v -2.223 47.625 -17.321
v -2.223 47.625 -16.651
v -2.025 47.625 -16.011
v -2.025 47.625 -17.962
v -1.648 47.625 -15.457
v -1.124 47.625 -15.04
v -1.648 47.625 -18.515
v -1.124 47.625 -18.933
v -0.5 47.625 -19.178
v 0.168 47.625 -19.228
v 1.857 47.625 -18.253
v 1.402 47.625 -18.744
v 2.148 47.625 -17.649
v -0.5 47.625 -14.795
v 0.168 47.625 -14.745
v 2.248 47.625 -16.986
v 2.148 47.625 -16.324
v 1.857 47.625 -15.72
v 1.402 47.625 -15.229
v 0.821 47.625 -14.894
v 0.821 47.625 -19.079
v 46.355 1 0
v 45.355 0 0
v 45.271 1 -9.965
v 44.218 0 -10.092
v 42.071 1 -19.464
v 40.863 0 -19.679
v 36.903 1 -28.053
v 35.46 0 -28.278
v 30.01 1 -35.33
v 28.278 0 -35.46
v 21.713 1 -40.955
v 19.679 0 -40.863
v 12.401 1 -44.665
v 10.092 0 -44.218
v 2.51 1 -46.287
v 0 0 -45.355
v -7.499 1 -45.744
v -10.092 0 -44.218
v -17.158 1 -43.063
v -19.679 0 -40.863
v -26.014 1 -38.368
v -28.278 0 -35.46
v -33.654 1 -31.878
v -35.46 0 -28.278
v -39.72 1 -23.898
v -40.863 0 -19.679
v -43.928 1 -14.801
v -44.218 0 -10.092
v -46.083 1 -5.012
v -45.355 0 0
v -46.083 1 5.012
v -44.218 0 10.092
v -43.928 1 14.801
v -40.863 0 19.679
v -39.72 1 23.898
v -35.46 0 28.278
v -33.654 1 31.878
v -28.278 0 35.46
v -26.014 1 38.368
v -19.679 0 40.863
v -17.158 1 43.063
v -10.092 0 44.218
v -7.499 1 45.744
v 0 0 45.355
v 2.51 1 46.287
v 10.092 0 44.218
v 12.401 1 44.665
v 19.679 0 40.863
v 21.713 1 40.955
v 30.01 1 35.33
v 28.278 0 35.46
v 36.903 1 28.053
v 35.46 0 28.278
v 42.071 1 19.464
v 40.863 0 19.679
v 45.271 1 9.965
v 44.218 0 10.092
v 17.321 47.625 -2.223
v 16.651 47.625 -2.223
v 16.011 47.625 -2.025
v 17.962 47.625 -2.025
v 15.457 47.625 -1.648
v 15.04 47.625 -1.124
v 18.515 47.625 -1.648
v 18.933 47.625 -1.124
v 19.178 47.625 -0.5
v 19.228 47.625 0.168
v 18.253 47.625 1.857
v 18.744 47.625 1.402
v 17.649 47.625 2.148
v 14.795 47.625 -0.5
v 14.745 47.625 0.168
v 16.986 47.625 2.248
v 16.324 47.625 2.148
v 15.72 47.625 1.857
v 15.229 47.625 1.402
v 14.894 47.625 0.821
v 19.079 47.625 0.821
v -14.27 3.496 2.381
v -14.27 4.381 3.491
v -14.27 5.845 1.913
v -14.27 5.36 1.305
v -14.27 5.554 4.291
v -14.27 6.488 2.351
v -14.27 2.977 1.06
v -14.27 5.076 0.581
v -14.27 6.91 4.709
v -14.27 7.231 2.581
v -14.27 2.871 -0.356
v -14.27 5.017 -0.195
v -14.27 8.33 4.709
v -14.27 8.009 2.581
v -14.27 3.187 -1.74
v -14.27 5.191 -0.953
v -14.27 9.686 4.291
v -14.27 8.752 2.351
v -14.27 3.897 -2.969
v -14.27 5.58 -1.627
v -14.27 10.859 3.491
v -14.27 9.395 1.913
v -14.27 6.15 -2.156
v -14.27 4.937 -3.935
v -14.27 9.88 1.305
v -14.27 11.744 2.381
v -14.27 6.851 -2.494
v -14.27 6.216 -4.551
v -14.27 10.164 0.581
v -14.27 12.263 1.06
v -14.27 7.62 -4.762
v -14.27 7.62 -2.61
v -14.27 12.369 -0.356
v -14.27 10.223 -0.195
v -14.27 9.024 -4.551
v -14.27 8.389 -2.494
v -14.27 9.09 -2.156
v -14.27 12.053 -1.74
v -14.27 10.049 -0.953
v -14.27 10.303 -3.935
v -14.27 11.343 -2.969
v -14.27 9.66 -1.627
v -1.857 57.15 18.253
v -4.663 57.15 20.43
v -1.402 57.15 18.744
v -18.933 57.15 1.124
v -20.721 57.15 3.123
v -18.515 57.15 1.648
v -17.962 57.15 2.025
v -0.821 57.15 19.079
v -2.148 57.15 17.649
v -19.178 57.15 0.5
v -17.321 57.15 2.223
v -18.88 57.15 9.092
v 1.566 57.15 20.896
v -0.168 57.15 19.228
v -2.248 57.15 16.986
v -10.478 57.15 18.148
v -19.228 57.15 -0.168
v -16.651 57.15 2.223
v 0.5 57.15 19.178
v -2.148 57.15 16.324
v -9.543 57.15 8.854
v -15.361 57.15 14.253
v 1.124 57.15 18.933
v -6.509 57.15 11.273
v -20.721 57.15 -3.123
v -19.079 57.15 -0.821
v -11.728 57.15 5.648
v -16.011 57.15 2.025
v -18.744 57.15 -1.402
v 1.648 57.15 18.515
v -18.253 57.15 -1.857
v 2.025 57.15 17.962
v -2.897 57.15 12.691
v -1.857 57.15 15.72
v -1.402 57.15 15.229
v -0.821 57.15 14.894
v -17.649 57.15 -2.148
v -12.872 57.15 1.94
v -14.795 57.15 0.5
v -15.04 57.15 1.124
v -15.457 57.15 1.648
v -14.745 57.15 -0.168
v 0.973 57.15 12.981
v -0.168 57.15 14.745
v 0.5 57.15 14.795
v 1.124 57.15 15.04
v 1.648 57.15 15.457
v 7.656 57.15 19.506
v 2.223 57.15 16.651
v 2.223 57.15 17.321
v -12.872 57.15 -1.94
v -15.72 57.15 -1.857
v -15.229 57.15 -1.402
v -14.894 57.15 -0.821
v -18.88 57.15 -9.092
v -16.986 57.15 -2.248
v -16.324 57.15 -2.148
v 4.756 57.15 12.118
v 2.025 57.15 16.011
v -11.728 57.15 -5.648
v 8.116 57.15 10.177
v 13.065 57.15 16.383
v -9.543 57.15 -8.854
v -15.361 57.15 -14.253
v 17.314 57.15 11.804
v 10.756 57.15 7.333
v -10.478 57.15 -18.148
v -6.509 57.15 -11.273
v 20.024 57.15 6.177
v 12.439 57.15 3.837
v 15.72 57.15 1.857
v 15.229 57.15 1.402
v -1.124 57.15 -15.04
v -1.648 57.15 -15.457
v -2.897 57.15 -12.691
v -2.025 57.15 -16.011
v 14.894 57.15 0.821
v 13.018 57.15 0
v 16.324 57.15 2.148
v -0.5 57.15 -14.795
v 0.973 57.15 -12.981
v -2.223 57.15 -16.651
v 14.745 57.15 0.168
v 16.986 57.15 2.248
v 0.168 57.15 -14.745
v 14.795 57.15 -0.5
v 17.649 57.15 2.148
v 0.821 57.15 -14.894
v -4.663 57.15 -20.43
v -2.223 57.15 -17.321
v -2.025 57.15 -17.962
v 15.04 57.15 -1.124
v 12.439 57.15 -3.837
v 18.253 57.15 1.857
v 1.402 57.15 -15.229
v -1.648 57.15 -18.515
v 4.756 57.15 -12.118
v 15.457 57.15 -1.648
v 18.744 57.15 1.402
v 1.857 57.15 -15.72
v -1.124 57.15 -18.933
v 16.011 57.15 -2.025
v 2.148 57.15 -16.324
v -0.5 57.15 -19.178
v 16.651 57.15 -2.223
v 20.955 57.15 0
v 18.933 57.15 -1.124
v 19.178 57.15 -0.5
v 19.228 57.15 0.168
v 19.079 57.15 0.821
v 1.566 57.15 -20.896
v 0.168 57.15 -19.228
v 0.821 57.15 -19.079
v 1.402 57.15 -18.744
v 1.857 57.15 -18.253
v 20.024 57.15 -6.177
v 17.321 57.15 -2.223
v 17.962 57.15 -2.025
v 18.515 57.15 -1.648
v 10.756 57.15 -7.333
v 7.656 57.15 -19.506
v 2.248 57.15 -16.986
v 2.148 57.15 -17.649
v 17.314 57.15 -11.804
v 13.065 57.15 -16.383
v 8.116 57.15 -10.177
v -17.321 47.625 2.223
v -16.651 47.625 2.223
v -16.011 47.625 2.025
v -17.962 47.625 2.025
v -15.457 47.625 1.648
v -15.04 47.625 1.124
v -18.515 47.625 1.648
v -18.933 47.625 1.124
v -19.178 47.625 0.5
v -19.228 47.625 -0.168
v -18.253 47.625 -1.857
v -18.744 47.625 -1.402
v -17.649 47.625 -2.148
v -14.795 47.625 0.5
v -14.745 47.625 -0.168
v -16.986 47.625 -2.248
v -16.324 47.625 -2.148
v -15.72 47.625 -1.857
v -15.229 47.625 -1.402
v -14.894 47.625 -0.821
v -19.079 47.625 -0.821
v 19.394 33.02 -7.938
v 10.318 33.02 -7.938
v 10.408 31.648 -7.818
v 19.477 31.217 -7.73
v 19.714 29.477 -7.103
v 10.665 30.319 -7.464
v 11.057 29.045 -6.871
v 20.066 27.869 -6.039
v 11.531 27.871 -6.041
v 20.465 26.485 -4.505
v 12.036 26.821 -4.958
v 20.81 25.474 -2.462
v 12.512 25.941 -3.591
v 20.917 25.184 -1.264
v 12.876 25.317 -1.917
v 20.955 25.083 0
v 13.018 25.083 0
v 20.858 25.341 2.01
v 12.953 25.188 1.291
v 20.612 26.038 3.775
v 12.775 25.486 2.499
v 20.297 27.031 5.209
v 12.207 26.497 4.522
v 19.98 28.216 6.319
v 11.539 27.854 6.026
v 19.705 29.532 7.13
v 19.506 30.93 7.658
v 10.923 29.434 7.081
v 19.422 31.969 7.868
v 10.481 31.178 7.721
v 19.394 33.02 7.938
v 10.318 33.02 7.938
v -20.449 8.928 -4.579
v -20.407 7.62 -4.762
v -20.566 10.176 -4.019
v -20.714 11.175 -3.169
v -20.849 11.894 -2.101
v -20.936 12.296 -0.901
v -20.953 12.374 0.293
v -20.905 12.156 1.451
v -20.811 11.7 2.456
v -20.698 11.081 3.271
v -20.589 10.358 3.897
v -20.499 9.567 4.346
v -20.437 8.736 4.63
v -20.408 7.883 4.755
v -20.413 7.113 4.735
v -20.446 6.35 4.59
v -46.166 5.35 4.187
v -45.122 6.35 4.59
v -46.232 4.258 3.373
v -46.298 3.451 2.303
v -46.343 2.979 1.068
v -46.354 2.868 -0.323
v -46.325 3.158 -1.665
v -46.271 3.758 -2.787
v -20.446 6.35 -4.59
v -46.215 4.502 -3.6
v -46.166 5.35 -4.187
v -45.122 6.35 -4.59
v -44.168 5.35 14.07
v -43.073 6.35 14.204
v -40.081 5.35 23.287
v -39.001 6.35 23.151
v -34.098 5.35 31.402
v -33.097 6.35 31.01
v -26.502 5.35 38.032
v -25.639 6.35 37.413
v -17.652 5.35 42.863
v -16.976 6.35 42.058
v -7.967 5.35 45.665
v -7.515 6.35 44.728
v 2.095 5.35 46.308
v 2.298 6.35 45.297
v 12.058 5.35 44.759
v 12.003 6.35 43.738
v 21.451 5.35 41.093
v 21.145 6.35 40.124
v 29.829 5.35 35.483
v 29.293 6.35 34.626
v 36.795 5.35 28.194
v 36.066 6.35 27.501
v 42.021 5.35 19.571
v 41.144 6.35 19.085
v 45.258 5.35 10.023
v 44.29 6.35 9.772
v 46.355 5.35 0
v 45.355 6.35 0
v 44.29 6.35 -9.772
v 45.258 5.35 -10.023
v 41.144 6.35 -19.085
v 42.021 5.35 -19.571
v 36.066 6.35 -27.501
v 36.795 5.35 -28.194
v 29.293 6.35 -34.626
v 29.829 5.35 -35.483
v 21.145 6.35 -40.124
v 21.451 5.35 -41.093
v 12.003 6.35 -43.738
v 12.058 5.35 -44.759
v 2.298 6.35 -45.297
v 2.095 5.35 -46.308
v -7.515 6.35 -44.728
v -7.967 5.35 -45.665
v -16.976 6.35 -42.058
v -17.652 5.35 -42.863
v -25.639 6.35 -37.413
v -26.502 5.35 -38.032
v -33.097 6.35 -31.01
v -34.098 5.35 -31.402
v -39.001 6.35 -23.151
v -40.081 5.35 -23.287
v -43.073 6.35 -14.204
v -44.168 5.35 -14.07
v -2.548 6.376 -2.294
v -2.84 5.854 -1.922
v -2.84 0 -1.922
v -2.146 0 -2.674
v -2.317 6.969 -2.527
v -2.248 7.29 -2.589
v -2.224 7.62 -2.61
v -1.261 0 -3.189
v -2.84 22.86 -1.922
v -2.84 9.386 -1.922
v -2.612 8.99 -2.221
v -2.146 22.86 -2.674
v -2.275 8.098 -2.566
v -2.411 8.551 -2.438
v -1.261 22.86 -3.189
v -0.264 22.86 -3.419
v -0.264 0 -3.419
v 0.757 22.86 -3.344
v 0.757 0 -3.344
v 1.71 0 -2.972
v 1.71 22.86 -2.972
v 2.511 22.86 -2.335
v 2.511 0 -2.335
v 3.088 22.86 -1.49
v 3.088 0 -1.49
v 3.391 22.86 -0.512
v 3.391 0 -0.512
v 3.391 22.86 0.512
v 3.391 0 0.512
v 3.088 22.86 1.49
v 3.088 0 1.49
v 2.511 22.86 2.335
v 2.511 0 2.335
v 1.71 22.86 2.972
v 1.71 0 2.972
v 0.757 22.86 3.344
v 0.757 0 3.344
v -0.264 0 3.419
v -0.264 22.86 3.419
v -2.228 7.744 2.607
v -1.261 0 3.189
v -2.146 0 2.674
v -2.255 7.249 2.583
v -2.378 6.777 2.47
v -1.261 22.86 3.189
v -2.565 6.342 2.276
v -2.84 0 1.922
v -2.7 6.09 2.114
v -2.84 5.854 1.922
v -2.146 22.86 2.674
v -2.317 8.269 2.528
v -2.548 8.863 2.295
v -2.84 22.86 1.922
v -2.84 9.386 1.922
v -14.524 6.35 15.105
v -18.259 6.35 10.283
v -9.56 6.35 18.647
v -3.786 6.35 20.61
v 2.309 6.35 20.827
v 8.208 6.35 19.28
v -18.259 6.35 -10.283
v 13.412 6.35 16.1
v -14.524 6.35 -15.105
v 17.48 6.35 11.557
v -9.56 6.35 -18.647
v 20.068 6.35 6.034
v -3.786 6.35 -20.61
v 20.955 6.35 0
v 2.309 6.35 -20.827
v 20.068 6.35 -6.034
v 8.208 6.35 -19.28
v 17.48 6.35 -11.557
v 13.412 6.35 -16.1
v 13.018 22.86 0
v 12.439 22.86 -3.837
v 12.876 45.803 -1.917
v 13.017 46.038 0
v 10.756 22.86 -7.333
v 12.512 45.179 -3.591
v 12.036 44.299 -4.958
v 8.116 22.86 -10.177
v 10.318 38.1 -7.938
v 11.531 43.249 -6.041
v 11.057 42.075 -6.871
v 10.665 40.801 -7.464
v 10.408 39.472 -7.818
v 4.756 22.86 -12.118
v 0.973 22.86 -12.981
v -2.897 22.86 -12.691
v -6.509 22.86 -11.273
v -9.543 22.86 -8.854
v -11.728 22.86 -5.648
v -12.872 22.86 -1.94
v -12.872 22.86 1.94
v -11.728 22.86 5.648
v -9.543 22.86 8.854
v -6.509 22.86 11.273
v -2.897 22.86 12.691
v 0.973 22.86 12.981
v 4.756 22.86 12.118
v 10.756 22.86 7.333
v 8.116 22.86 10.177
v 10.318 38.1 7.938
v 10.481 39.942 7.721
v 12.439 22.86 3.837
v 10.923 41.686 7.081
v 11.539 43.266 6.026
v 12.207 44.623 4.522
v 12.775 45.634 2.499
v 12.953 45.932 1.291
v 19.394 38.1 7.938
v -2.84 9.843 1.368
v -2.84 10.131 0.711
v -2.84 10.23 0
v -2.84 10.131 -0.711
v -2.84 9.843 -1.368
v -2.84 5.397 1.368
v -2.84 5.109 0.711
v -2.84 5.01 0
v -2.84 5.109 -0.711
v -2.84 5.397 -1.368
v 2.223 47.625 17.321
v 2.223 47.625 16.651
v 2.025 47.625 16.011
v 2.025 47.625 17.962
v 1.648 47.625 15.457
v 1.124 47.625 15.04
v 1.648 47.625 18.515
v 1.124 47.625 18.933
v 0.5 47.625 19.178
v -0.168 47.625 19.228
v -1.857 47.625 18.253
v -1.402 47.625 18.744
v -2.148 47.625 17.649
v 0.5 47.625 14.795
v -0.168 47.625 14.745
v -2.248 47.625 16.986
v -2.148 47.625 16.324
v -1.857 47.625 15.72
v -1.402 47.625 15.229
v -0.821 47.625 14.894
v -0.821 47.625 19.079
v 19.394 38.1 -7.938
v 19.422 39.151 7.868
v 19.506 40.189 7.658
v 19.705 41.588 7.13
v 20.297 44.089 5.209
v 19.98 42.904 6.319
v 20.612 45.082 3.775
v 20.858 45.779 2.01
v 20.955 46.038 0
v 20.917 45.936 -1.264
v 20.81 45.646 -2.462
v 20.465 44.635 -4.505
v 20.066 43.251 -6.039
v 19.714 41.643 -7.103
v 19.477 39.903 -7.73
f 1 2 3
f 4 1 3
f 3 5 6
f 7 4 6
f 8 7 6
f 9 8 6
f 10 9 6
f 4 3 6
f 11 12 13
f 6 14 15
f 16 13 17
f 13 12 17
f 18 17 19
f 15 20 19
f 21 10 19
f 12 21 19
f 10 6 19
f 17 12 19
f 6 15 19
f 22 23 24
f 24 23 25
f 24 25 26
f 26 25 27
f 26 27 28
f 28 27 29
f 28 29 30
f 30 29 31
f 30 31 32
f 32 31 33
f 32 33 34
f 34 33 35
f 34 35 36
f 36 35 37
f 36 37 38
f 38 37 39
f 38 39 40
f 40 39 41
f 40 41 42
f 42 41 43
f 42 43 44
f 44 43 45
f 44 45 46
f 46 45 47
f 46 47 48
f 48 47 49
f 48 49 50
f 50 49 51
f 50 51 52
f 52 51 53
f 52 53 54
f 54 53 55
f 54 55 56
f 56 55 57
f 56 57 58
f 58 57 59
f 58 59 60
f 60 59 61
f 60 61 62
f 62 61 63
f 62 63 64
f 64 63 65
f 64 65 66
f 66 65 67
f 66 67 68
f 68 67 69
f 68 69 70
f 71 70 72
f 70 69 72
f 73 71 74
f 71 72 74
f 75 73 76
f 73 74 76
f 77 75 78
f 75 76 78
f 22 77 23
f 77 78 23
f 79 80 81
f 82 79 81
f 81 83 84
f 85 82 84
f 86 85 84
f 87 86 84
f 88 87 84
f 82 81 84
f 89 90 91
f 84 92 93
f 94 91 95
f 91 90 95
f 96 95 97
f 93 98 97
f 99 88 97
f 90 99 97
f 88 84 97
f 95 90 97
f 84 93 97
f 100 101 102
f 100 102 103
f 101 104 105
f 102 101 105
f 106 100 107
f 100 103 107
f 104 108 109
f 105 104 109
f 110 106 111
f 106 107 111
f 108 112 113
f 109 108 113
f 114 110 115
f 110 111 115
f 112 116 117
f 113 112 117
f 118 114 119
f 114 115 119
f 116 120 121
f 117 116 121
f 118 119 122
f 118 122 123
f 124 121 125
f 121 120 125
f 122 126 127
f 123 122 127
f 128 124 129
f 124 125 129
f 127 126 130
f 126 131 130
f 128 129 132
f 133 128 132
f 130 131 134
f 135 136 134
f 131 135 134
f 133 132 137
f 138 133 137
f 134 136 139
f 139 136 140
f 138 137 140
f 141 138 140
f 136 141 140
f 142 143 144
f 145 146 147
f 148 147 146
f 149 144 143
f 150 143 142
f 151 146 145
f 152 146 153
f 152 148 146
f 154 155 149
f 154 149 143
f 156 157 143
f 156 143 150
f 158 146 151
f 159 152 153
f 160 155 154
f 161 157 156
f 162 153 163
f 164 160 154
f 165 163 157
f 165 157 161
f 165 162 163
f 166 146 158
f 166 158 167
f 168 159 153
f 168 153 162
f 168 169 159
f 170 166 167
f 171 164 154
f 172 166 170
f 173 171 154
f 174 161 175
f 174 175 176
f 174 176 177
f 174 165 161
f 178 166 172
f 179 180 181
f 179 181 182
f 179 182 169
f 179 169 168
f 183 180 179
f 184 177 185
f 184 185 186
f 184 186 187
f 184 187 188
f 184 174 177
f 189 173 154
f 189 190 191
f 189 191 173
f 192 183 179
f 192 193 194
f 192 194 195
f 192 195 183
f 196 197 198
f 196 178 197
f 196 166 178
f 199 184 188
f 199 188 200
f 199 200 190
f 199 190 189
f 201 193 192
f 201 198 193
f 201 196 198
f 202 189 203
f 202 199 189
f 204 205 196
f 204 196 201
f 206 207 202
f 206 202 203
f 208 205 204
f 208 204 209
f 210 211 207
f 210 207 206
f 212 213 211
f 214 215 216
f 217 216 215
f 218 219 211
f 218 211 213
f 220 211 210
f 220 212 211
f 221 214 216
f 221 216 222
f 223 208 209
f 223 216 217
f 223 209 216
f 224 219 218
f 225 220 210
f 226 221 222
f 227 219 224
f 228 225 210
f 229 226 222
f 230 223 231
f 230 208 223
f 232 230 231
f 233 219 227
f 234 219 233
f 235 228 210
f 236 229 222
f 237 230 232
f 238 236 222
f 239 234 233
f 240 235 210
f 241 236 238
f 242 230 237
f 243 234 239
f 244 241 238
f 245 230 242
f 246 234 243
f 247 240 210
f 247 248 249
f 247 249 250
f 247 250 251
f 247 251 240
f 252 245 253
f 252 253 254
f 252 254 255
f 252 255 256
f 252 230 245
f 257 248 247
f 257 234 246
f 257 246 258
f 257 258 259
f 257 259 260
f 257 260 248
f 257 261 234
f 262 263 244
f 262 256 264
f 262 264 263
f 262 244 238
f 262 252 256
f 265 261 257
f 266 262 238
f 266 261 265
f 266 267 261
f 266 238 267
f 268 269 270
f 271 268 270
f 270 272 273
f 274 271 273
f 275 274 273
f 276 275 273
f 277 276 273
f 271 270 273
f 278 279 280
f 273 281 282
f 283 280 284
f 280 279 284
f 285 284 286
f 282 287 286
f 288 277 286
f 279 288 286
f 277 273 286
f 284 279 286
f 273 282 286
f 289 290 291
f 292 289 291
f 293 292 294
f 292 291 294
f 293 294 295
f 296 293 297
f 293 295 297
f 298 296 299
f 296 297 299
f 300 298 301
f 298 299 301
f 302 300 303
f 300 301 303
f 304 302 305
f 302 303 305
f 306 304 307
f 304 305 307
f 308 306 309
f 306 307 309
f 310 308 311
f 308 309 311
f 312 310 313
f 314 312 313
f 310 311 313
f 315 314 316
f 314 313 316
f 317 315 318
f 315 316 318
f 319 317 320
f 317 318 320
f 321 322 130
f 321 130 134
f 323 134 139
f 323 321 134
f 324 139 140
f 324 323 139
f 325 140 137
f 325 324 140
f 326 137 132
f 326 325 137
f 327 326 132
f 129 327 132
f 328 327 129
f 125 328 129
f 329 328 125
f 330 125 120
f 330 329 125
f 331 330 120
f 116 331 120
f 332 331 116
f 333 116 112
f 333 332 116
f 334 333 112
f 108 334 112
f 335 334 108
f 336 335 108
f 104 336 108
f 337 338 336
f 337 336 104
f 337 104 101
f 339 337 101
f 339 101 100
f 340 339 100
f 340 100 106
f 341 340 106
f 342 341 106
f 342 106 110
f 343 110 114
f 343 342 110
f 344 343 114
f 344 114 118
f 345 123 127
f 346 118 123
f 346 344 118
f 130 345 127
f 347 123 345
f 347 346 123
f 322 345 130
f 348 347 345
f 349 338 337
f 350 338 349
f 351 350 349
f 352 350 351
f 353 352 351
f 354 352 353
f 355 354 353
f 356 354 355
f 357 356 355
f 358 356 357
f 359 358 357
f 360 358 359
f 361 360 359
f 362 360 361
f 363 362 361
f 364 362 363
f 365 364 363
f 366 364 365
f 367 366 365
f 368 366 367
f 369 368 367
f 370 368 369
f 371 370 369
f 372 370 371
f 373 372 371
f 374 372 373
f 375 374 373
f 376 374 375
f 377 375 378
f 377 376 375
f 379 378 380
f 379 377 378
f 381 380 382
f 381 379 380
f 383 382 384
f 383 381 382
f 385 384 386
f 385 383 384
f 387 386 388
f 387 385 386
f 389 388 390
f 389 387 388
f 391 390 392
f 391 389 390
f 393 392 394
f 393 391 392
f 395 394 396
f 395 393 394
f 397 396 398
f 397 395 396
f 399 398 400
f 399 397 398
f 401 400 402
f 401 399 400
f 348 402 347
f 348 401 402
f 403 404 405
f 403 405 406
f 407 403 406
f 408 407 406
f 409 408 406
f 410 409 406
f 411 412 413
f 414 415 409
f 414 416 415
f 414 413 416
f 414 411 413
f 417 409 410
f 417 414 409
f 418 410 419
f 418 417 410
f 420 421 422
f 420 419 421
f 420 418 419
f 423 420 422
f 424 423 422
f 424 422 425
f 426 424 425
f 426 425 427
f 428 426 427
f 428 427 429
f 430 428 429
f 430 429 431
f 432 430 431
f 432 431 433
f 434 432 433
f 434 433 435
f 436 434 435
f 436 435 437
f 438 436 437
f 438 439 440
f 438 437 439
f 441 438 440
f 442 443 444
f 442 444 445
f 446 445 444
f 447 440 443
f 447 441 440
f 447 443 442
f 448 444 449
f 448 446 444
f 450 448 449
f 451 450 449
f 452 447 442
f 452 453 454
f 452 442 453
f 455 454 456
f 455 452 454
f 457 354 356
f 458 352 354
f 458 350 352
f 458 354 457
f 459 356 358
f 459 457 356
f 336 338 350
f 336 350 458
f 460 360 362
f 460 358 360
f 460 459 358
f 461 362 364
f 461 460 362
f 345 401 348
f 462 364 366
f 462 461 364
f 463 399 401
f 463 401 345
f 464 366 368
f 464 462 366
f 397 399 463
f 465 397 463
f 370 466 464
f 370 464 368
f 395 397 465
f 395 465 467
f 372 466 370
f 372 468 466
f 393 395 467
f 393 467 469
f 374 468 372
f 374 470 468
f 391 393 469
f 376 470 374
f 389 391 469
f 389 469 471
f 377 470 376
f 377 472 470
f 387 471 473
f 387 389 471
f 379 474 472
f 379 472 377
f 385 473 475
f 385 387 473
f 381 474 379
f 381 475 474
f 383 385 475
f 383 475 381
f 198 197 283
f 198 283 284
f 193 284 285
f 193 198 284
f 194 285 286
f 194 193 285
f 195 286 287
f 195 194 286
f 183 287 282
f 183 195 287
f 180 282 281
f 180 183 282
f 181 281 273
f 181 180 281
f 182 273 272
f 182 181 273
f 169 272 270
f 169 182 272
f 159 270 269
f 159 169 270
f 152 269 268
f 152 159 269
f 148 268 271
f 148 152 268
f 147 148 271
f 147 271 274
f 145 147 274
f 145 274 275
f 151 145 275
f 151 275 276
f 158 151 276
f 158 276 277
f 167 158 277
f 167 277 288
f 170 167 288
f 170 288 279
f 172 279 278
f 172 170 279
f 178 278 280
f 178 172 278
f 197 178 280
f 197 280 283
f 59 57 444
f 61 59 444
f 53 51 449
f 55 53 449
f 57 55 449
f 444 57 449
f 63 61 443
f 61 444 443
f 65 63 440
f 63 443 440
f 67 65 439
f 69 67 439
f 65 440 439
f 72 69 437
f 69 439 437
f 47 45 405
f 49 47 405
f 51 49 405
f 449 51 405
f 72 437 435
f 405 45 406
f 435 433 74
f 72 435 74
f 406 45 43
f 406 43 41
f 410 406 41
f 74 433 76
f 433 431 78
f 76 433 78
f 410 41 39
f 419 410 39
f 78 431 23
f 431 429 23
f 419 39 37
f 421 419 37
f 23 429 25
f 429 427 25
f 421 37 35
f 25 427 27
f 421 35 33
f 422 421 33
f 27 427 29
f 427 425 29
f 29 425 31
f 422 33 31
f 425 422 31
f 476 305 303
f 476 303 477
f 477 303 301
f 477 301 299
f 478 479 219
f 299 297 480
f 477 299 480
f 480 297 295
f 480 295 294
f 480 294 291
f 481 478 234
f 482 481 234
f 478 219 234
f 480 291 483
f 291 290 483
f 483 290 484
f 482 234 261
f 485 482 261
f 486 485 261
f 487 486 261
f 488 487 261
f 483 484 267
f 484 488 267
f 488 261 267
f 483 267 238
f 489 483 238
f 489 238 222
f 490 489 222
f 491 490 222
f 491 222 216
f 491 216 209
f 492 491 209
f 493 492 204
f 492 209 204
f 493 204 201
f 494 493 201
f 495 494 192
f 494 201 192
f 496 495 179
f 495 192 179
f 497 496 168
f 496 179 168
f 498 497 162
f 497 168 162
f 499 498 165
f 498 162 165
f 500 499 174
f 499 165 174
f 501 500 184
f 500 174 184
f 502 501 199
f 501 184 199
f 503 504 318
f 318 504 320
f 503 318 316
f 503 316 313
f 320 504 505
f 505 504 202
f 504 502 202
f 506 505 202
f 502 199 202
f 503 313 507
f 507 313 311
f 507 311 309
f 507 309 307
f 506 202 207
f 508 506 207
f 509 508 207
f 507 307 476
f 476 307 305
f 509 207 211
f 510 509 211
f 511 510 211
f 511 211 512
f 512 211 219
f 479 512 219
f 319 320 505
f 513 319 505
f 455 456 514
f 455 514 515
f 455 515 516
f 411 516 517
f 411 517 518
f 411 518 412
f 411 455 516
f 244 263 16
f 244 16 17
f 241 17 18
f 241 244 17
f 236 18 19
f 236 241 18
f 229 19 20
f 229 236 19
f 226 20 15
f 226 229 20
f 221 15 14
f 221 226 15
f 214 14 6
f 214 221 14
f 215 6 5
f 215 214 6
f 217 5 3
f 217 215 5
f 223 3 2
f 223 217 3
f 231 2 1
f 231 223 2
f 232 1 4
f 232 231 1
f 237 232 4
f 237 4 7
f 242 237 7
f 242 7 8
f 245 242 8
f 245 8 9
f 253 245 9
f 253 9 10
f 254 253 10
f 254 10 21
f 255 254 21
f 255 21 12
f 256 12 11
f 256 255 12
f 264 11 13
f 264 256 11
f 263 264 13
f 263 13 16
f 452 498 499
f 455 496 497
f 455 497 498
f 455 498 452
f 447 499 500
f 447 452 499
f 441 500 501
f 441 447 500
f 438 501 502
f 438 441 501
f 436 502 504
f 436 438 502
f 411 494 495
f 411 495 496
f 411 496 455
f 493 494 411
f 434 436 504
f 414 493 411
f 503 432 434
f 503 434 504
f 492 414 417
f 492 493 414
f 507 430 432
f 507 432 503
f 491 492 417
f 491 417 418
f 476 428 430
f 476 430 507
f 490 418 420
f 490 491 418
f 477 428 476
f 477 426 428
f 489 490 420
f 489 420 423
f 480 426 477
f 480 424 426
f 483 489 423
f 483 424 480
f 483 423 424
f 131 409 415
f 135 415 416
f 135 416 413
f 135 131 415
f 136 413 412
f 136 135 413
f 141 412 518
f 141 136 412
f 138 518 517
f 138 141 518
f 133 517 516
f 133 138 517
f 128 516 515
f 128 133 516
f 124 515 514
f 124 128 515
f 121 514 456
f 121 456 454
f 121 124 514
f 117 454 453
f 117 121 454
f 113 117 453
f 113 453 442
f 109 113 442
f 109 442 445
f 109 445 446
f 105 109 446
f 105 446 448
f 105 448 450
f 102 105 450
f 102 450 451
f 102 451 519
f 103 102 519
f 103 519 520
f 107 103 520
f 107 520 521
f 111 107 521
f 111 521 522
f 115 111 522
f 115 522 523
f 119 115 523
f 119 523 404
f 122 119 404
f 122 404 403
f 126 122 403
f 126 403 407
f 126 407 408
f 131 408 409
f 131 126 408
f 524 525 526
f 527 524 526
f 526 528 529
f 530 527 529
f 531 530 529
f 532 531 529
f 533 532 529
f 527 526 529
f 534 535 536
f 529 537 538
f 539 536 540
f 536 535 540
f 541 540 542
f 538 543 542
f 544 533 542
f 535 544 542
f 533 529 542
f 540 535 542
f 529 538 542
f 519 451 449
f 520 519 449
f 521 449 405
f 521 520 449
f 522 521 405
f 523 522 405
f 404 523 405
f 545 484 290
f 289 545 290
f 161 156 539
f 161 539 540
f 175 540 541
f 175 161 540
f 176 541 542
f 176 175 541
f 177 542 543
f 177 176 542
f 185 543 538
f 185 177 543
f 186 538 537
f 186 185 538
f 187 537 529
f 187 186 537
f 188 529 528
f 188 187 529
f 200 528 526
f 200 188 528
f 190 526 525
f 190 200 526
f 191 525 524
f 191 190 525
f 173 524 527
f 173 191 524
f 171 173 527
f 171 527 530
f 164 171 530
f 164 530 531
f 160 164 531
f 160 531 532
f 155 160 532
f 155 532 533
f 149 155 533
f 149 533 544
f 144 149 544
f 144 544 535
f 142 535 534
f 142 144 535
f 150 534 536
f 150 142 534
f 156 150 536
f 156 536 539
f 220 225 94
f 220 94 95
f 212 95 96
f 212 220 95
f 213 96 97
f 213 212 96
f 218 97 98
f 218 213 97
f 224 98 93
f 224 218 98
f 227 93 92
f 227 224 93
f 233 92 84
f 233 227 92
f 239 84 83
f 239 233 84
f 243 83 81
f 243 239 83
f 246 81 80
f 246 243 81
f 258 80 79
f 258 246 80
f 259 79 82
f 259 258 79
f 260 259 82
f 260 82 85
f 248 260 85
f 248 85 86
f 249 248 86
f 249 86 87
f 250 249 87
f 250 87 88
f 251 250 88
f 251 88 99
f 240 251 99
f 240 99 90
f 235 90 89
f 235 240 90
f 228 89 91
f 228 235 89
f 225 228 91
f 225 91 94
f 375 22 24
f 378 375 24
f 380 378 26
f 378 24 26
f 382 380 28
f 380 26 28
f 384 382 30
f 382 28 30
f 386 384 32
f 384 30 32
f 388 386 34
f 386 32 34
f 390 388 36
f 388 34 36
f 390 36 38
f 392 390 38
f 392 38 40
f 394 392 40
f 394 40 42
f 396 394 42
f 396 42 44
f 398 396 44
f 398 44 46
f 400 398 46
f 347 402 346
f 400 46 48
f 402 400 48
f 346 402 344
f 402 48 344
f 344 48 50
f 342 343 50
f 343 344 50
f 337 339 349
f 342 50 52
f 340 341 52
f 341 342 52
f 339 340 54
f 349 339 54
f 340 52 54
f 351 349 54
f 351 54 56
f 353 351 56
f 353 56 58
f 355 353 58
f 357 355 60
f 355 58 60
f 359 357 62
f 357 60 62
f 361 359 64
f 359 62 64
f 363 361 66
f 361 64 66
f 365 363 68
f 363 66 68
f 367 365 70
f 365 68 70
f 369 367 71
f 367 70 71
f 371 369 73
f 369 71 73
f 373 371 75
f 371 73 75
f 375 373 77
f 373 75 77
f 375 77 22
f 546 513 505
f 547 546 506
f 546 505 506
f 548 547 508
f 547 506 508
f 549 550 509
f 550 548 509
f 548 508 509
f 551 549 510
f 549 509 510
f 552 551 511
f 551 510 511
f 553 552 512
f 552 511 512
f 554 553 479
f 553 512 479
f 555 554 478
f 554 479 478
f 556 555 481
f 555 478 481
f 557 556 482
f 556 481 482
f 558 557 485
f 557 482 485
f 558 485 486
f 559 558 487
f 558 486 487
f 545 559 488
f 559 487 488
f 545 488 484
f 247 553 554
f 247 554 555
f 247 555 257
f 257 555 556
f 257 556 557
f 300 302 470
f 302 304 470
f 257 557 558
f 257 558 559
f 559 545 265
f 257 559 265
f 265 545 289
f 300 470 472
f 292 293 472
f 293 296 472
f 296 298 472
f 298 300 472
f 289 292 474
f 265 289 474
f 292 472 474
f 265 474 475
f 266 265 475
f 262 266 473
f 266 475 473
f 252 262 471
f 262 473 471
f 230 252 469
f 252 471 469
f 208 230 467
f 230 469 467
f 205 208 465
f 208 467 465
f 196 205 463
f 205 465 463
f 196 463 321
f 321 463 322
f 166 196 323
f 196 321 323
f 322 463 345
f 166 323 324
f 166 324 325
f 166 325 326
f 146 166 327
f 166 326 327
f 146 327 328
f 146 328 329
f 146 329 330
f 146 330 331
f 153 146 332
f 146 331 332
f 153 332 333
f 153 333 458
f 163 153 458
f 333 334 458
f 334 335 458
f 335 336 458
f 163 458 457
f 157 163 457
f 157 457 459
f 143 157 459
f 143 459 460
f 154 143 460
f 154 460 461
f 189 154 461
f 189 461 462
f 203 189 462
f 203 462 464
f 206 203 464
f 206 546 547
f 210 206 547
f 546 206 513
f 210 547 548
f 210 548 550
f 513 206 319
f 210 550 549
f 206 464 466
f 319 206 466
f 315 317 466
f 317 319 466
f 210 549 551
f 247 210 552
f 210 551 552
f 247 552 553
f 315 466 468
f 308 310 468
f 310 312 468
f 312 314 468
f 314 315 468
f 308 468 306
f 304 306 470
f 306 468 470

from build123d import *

# Parameters (mm, degrees)
SKETCH1_R           = 46.355
BOSS_EXTRUDE1_DEPTH = 6.35
SKETCH2_R           = 20.955
BOSS_EXTRUDE2_DEPTH = 50.8
CUT_EXTRUDE1_REACH  = 59.15
SKETCH3_3_R         = 13.0175
CUT_EXTRUDE2_DEPTH  = 34.29
CUT_EXTRUDE3_REACH  = 48.355
SKETCH5_5_R         = 2.2479
CUT_EXTRUDE7_DEPTH  = 9.525
CIRPATTERN1_COUNT   = 4
CUT_EXTRUDE8_REACH  = 95.345
SKETCH6_R           = 2.60985
SKETCH6_4_R         = 4.7625
CUT_EXTRUDE9_DEPTH  = 32.72
CHAMFER1_SIZE       = 1


with BuildPart() as part:
    # Sketch1 → Boss-Extrude1 (new body)
    with BuildSketch(Plane(origin=(0, 0, 0), x_dir=(1, 0, 0), z_dir=(0, 1, 0))):
        Circle(SKETCH1_R)
    extrude(amount=BOSS_EXTRUDE1_DEPTH)

    # Sketch2 → Boss-Extrude2 (add)
    with BuildSketch(Plane(origin=(0, 6.35, 0), x_dir=(1, 0, 0), z_dir=(0, 1, 0))):
        Circle(SKETCH2_R)
    extrude(amount=BOSS_EXTRUDE2_DEPTH)

    # Sketch3 → Cut-Extrude1 (cut, up to next)
    with BuildSketch(Plane(origin=(0, 57.15, 0), x_dir=(1, 0, 0), z_dir=(0, 1, 0)), mode=Mode.PRIVATE) as cut_extrude1_sk1:
        with BuildLine():
            Line((-2.84, -1.921572533), (-2.84, 1.921572533))
            ThreePointArc((-2.84, 1.921572533), (3.429, 0), (-2.84, -1.921572533))
        make_face()
    cut_extrude1_tool1 = extrude(cut_extrude1_sk1.sketch, amount=-CUT_EXTRUDE1_REACH, mode=Mode.PRIVATE) & part.part
    add(cut_extrude1_tool1.solids().sort_by_distance((0.133614, 57.15, 0))[0], mode=Mode.SUBTRACT)

    # Sketch3_3 → Cut-Extrude2 (cut)
    with BuildSketch(Plane(origin=(0, 57.15, 0), x_dir=(1, 0, 0), z_dir=(0, 1, 0))):
        Circle(SKETCH3_3_R)
    extrude(amount=-CUT_EXTRUDE2_DEPTH, mode=Mode.SUBTRACT)

    # Sketch4 → Cut-Extrude3 (cut, up to next)
    with BuildSketch(Plane(origin=(0, 0, 0), x_dir=(0, 0, -1), z_dir=(1, 0, 0)), mode=Mode.PRIVATE) as cut_extrude3_sk1:
        with BuildLine():
            ThreePointArc((7.9375, 33.02), (0, 25.0825), (-7.9375, 33.02))
            Line((-7.9375, 33.02), (-7.9375, 38.1))
            ThreePointArc((-7.9375, 38.1), (0, 46.0375), (7.9375, 38.1))
            Line((7.9375, 38.1), (7.9375, 33.02))
        make_face()
    cut_extrude3_tool1 = extrude(cut_extrude3_sk1.sketch, amount=CUT_EXTRUDE3_REACH, mode=Mode.PRIVATE) & part.part
    add(cut_extrude3_tool1.solids().sort_by_distance((0, 35.56, 0))[0], mode=Mode.SUBTRACT)

    # Sketch5_5 → Cut-Extrude7 (cut)
    with BuildSketch(Plane.XZ.offset(-57.15)):
        with Locations((0, -16.98625)):
            Circle(SKETCH5_5_R)
    cut_extrude7 = extrude(amount=CUT_EXTRUDE7_DEPTH, mode=Mode.SUBTRACT)

    # CirPattern1: Cut-Extrude7 ×4 about axis
    cirpattern1_axis = Axis((0, 0, 0), (0, 1, 0))
    for i in range(1, CIRPATTERN1_COUNT):
        add(cut_extrude7.rotate(cirpattern1_axis, i * 360 / CIRPATTERN1_COUNT), mode=Mode.SUBTRACT)

    # Sketch6 → Cut-Extrude8 (cut, up to next)
    with BuildSketch(Plane(origin=(-46.99, 0, 0), x_dir=(0, 0, -1), z_dir=(1, 0, 0)), mode=Mode.PRIVATE) as cut_extrude8_sk1:
        with Locations((0, 7.62)):
            Circle(SKETCH6_R)
    cut_extrude8_tool1 = extrude(cut_extrude8_sk1.sketch, amount=CUT_EXTRUDE8_REACH, mode=Mode.PRIVATE) & part.part
    add(cut_extrude8_tool1.solids().sort_by_distance((-46.99, 7.62, 0))[0], mode=Mode.SUBTRACT)

    # Sketch6_4 → Cut-Extrude9 (cut)
    with BuildSketch(Plane(origin=(-46.99, 0, 0), x_dir=(0, 0, -1), z_dir=(1, 0, 0))):
        with Locations((0, 7.62)):
            Circle(SKETCH6_4_R)
    extrude(amount=CUT_EXTRUDE9_DEPTH, mode=Mode.SUBTRACT)

    # Chamfer1
    chamfer1_edges = [part.edges().sort_by_distance(p)[0] for p in [
        (-46.355, 0, 0),
        (2.297847054, 6.35, 46.298012095),
    ]]
    chamfer(chamfer1_edges, length=CHAMFER1_SIZE)


solid = part.part
